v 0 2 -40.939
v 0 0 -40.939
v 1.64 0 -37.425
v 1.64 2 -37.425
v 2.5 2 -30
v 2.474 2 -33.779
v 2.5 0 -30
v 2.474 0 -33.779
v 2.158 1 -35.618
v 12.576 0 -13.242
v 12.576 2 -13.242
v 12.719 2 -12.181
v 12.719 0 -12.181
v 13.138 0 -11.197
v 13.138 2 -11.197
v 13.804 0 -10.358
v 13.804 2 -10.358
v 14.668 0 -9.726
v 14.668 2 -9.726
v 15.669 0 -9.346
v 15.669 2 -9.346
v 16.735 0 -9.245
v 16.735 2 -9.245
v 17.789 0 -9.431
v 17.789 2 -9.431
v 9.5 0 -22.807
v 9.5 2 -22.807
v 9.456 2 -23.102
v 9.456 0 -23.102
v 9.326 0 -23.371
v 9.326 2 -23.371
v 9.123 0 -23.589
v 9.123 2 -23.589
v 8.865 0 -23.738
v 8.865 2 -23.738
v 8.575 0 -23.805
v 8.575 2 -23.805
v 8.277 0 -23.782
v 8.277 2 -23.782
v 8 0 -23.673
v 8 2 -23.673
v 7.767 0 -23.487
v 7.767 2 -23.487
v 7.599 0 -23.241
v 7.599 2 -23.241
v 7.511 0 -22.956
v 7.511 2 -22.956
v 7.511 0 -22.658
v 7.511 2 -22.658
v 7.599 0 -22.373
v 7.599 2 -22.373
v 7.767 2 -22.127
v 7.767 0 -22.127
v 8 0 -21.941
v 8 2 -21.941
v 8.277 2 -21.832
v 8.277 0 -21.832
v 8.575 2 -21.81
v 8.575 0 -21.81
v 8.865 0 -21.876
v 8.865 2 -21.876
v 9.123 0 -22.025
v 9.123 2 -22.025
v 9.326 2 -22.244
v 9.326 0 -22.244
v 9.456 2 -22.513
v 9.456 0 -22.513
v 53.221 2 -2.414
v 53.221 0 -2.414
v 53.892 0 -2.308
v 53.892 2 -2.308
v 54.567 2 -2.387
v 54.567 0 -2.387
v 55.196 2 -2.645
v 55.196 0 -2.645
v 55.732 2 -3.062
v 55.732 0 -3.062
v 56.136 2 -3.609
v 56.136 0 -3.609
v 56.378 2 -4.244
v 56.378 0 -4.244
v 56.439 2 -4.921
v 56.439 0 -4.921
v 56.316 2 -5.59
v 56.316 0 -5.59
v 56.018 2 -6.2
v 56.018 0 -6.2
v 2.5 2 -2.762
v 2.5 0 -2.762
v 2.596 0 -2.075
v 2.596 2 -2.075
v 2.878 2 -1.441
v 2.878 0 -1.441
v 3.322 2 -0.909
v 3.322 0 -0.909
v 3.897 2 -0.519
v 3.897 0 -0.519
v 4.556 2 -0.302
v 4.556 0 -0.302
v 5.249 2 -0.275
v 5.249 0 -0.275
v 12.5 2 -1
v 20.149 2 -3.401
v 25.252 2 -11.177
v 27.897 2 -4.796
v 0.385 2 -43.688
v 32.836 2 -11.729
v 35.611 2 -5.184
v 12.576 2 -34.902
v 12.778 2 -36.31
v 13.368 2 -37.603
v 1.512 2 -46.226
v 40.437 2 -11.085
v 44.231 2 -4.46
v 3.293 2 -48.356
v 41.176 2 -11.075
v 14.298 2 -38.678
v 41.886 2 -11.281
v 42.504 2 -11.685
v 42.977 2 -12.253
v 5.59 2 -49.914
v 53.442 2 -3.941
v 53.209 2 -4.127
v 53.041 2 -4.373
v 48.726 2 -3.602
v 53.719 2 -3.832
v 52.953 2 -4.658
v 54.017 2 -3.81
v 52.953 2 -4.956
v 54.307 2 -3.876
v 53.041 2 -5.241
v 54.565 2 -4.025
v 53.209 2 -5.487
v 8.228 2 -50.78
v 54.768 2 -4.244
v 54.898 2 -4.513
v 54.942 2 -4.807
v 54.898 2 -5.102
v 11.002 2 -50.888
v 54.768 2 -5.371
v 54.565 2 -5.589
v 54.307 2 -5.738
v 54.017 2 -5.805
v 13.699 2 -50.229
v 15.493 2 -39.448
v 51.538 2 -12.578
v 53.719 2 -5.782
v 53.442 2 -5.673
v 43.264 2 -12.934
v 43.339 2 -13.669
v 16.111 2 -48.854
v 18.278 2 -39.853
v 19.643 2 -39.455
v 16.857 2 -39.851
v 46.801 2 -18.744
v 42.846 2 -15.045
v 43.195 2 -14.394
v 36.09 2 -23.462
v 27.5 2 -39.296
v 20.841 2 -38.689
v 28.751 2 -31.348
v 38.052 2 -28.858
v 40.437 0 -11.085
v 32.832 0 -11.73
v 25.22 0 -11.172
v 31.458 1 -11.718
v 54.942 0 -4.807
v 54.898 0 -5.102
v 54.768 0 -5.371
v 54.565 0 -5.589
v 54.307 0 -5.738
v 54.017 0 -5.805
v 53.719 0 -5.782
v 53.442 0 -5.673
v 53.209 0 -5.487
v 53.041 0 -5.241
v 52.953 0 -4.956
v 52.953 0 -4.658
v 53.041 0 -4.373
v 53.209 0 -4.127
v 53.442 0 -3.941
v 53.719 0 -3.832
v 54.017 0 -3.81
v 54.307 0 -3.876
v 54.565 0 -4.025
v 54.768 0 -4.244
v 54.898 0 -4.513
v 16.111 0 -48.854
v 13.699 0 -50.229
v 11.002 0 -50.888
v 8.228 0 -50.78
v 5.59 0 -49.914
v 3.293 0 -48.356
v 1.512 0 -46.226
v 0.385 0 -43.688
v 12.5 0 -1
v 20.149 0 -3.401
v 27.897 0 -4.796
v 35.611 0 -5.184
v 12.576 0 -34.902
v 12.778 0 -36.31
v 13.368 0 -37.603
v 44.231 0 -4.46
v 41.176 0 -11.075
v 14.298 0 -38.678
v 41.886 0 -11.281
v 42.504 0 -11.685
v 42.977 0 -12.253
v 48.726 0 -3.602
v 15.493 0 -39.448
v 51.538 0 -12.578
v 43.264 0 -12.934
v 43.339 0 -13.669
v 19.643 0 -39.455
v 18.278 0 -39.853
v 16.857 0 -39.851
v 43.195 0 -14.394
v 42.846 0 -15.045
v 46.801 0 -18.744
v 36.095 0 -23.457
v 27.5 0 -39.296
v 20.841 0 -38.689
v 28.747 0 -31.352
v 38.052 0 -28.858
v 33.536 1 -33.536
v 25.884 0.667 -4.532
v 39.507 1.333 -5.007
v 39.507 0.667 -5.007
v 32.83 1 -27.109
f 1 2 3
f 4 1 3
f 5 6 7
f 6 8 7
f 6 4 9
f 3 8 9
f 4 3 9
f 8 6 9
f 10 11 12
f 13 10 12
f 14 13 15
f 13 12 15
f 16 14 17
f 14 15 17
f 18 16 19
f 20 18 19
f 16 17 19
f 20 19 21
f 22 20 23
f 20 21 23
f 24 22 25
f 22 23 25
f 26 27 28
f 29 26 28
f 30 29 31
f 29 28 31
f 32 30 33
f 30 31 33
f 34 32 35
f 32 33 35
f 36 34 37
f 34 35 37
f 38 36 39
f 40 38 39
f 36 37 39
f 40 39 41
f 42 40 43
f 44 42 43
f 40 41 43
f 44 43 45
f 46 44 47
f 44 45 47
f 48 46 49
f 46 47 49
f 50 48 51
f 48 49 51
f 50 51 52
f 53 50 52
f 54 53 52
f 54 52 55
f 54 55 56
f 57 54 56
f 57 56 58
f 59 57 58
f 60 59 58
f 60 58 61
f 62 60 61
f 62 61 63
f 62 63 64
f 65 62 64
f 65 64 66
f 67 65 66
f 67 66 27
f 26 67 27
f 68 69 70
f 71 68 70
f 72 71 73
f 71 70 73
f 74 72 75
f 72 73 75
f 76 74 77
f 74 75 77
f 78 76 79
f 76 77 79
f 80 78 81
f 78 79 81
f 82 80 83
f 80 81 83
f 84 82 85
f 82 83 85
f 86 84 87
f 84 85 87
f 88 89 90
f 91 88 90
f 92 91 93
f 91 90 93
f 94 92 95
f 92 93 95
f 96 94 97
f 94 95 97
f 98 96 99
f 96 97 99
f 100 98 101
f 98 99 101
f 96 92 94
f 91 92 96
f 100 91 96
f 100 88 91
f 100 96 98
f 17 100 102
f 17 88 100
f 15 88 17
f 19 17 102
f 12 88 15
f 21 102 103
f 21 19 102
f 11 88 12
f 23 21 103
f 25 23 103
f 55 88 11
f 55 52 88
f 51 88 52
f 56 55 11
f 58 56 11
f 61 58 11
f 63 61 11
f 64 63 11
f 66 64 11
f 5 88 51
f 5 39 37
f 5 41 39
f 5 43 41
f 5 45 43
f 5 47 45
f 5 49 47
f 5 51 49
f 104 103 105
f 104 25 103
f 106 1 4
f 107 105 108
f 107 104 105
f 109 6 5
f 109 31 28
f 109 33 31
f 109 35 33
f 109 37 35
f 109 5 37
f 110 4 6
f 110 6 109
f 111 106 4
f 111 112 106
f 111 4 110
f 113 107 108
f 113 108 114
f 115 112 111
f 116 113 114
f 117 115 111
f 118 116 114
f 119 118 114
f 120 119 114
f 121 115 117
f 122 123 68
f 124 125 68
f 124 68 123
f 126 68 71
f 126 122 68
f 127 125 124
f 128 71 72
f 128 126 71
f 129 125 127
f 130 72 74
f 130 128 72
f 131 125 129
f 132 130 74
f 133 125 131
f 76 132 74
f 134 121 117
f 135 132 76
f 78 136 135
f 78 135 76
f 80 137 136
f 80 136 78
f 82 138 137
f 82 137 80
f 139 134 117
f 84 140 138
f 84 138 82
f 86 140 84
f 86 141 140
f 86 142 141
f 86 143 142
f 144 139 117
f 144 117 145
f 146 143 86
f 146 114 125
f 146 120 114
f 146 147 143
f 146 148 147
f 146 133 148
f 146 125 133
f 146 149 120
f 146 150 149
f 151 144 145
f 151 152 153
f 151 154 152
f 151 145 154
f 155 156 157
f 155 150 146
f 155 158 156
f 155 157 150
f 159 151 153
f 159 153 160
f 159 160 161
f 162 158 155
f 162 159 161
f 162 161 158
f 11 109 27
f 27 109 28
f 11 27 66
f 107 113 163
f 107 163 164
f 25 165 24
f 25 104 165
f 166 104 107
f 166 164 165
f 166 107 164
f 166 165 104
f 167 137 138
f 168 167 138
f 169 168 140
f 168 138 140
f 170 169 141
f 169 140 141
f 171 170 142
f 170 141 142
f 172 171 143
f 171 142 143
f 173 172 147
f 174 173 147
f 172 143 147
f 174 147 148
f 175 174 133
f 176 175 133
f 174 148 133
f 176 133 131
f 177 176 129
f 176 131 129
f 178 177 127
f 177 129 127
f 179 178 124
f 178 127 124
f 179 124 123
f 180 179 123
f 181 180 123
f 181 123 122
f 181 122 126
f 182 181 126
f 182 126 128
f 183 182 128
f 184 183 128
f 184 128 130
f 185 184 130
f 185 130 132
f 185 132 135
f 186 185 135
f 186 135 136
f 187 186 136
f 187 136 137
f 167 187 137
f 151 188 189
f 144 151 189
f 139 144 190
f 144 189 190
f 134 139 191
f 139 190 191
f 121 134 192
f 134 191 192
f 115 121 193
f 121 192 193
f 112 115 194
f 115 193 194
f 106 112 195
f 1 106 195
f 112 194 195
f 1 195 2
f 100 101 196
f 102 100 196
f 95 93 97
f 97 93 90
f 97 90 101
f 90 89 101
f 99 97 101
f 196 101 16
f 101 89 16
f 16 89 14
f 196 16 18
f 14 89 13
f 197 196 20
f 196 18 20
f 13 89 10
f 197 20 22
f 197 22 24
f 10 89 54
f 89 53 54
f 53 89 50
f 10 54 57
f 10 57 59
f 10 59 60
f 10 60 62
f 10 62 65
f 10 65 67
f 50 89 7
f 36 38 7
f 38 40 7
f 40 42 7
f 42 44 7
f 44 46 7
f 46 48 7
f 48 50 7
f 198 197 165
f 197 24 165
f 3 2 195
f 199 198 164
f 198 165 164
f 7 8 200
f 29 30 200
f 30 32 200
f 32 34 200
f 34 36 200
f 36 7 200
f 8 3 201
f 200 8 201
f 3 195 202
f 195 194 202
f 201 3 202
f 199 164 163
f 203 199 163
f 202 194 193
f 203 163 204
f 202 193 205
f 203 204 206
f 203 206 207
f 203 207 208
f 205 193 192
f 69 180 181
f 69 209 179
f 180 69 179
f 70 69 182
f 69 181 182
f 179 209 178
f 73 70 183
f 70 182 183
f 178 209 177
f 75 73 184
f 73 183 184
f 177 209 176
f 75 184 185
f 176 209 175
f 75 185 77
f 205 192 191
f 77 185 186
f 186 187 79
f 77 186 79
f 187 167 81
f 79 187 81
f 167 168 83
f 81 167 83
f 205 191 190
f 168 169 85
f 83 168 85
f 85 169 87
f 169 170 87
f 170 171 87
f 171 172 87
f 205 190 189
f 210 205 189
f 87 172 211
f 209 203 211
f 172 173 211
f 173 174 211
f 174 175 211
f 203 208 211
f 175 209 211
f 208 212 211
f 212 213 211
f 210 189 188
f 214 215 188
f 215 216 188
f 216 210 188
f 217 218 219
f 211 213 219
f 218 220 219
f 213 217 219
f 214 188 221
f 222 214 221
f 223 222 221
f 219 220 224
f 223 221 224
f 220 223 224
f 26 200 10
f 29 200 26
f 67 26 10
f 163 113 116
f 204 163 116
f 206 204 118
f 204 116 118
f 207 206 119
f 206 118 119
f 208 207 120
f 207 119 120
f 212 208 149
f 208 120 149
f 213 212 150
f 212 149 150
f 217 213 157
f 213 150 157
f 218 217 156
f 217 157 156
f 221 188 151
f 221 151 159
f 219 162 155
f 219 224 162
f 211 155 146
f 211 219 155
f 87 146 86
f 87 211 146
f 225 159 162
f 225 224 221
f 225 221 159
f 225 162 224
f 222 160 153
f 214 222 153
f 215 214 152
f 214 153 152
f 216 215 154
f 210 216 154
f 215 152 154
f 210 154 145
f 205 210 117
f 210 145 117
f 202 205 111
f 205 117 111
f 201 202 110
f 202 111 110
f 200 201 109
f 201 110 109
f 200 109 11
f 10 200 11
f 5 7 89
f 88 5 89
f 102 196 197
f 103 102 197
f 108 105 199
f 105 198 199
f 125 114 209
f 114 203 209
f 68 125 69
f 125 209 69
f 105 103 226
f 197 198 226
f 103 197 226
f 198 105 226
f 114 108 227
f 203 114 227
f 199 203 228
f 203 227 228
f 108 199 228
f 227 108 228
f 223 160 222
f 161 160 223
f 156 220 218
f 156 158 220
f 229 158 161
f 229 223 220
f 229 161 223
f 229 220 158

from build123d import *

# Parameters (mm, degrees)
BOSS_EXTRUDE1_DEPTH = 2
SKETCH2_R           = 1
CUT_EXTRUDE1_DEPTH  = 3.0000001


with BuildPart() as part:
    # Sketch1 → Boss-Extrude1 (new body)
    with BuildSketch(Plane(origin=(0, 0, 0), x_dir=(1, 0, 0), z_dir=(0, 1, 0))):
        with BuildLine():
            Line((5.248759298, 0.27487593), (12.5, 1))
            add(Edge.make_bspline(
                [(12.5, 1), (25.716292058, 6.056775104), (39.5099436, 6.545604881), (53.220608515, 2.413649078)],
                knots=[0, 0, 0, 0, 0.858701094, 0.858701094, 0.858701094, 0.858701094], degree=3))
            ThreePointArc((53.220608515, 2.413649078), (55.952811517, 3.321860873), (56.017920205, 6.200322748))
            add(Edge.make_bspline(
                [(16.11119686, 48.85407535), (22.252071457, 44.112915248), (36.940561271, 31.197181318), (49.405904782, 16.053895714), (56.017920205, 6.200322748)],
                knots=[0.227142679, 0.227142679, 0.227142679, 0.227142679, 0.499193547, 0.914214996, 0.914214996, 0.914214996, 0.914214996], degree=3))
            ThreePointArc((16.11119686, 48.85407535), (5.590463097, 49.913991867), (0, 40.938693304))
            add(Edge.make_bspline(
                [(0, 40.938693304), (3.065585296, 35.767628216), (2.5, 30)],
                knots=[0, 0, 0, 1, 1, 1], degree=2))
            Line((2.5, 30), (2.5, 2.762468905))
            ThreePointArc((2.5, 2.762468905), (3.322486698, 0.908837571), (5.248759298, 0.27487593))
        make_face()
    extrude(amount=BOSS_EXTRUDE1_DEPTH)

    # Sketch2 → Cut-Extrude1 (cut, through all)
    with BuildSketch(Plane(origin=(0, 2, 0), x_dir=(1, 0, 0), z_dir=(0, 1, 0))):
        with Locations((53.941981842, 4.807311653)):
            Circle(SKETCH2_R)
        with Locations((8.5, 22.807311653)):
            Circle(SKETCH2_R)
        with BuildLine():
            Line((12.575662954, 34.90249481), (12.575662954, 13.24232221))
            ThreePointArc((12.575662954, 13.24232221), (14.214859141, 10.01329676), (17.788965632, 9.430774412))
            add(Edge.make_bspline(
                [(40.437472292, 11.085030457), (37.44717133, 11.574532132), (29.837808842, 12.110288208), (22.250510571, 10.850986019), (17.788965632, 9.430774412)],
                knots=[0.180465319, 0.180465319, 0.180465319, 0.180465319, 0.4409169, 0.841911756, 0.841911756, 0.841911756, 0.841911756], degree=3))
            ThreePointArc((40.437472292, 11.085030457), (42.977221324, 12.252961632), (42.846470999, 15.045324919))
            add(Edge.make_bspline(
                [(20.840843033, 38.689129074), (25.058258326, 35.052490455), (32.827221728, 27.546668383), (39.711612857, 19.255139389), (42.846470999, 15.045324919)],
                knots=[0.21322067, 0.21322067, 0.21322067, 0.21322067, 0.550339586, 0.867457281, 0.867457281, 0.867457281, 0.867457281], degree=3))
            ThreePointArc((20.840843033, 38.689129074), (15.493104479, 39.448146601), (12.575662954, 34.90249481))
        make_face()
    extrude(amount=-CUT_EXTRUDE1_DEPTH, mode=Mode.SUBTRACT)


solid = part.part
